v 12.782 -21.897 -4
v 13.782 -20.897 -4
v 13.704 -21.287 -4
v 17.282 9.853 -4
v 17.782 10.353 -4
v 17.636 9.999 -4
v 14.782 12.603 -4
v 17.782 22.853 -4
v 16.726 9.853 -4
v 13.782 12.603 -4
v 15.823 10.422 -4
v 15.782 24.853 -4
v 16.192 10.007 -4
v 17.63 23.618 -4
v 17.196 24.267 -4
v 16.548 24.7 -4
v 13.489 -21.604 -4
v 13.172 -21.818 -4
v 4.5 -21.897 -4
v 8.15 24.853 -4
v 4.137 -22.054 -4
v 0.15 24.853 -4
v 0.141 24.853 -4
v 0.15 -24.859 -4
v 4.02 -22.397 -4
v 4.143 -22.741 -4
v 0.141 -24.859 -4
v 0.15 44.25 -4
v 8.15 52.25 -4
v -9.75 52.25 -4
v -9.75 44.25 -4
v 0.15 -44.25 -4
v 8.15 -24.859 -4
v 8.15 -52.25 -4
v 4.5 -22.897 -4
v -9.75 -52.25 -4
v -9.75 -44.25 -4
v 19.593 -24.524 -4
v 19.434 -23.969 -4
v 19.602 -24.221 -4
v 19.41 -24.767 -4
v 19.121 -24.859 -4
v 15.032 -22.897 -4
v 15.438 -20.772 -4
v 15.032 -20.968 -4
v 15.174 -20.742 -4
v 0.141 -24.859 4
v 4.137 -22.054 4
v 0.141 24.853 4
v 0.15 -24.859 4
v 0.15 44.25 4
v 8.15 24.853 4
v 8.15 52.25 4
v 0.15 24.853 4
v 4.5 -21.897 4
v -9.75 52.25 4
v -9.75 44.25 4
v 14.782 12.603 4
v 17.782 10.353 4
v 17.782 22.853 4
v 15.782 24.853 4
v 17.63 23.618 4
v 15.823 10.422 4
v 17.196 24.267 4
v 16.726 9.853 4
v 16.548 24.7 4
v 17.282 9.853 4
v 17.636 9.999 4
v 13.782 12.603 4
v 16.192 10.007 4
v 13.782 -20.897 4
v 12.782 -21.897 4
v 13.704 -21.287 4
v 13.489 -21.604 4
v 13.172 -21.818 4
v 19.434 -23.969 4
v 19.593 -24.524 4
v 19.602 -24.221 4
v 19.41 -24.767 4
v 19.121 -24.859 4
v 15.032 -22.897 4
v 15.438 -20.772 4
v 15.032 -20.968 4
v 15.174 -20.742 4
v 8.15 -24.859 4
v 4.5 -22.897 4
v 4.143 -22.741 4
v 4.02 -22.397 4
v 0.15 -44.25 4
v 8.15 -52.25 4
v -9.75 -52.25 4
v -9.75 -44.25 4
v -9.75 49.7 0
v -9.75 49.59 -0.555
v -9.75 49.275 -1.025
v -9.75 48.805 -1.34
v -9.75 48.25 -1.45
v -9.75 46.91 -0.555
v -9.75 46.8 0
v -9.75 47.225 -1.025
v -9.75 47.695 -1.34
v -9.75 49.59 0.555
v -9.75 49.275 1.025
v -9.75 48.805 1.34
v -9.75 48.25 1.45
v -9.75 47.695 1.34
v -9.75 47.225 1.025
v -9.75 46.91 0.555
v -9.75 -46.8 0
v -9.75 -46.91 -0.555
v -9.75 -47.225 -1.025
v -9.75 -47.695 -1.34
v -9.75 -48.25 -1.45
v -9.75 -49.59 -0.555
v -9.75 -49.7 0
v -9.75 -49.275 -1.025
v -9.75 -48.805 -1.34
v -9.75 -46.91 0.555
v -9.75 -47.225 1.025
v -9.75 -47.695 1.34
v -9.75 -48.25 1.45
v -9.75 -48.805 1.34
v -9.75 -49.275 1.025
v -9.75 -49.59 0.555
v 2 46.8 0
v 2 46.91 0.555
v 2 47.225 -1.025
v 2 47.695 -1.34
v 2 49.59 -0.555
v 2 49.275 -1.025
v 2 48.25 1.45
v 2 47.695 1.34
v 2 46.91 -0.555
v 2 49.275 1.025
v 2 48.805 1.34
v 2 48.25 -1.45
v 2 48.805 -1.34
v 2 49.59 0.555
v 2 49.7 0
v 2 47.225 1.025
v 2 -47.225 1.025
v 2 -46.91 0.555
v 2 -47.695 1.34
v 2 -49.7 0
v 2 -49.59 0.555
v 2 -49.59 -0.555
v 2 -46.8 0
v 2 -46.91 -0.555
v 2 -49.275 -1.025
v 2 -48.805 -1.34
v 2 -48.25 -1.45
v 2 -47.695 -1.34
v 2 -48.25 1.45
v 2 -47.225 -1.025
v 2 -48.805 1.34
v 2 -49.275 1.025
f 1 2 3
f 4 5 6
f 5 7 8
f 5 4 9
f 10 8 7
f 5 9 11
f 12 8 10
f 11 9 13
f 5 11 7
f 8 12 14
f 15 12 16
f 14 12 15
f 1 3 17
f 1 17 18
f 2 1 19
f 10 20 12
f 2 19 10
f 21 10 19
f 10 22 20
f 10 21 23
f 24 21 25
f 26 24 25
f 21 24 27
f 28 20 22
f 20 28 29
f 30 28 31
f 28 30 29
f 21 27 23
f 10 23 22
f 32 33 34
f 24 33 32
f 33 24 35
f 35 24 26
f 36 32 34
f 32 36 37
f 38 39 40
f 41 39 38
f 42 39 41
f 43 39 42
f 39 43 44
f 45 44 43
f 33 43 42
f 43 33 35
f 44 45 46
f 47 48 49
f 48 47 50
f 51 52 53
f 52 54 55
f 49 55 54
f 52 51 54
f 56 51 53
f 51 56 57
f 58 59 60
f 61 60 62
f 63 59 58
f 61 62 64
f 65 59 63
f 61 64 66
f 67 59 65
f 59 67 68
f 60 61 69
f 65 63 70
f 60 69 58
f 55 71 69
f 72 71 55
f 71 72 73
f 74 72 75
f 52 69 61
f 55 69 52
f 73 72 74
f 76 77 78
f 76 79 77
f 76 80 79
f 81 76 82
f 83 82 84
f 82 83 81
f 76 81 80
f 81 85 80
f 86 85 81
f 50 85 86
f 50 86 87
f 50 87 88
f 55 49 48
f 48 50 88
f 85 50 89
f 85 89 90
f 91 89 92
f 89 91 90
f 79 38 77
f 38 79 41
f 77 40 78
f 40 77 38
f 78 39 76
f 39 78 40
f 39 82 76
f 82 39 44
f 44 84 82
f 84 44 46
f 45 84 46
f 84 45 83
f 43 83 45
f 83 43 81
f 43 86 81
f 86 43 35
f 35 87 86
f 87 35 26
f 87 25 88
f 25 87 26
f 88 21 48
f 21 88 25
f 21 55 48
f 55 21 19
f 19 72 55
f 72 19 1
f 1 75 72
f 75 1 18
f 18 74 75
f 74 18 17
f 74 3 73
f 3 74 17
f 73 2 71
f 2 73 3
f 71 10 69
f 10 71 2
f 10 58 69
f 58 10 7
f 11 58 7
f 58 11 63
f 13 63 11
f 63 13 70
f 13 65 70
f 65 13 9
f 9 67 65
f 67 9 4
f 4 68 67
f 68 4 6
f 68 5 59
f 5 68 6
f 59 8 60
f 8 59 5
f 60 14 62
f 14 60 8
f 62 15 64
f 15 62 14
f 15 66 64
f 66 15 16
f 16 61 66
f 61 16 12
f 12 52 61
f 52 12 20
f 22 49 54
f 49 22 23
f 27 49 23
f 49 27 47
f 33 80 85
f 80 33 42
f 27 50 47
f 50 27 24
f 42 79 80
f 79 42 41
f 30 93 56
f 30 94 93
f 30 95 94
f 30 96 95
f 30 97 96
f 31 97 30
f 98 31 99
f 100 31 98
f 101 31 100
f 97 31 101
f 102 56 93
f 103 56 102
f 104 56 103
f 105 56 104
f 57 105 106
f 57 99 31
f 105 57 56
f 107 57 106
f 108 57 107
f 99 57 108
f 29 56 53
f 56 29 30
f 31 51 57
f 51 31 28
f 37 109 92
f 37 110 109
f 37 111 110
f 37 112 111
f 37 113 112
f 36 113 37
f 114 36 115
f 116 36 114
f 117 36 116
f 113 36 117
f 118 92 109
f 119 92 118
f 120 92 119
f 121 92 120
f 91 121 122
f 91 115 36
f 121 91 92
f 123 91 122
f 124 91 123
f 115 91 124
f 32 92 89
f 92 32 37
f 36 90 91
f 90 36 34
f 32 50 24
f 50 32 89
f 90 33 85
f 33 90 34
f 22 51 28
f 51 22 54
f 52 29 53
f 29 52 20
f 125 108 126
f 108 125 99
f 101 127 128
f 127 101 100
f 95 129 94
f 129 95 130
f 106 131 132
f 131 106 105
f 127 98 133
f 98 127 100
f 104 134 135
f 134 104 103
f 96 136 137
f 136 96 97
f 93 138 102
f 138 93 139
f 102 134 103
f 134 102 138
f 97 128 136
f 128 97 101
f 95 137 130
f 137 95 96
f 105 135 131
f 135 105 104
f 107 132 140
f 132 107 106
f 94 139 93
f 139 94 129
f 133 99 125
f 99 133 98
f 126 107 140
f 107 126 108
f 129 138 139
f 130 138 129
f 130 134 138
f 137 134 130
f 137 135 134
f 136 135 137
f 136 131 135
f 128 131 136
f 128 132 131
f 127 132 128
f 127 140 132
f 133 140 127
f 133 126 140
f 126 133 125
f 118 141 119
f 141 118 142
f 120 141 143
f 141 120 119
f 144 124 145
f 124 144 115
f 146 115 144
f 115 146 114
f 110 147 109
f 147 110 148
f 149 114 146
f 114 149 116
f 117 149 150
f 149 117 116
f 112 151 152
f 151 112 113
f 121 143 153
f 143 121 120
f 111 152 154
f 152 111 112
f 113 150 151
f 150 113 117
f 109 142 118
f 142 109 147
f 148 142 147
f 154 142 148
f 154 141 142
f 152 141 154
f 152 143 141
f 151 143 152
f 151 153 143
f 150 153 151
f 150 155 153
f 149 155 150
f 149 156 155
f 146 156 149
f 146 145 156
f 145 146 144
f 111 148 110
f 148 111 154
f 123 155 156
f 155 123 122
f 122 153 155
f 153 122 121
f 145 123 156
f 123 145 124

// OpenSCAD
THICKNESS = 8;
HOLE_DEPTH = 10;
HOLE_DIAMETER = 2.9;
HOLE_DISTANCE = 96.5;

module din_clip() 
{	
	translate([0,-25,0]) 
	{
		difference() 
		{
			linear_extrude(height=THICKNESS, center=true, convexity=5) 
			{
				import(file="din_clip.dxf", layer="0", $fn=64);
			}
		}
	}
}

module din_mount()
{
	difference()
	{
		union()
		{
			din_clip();
			translate([-HOLE_DEPTH/2+0.25, HOLE_DISTANCE/2, 0]) cube([HOLE_DEPTH,THICKNESS,THICKNESS],center=true);
			translate([-HOLE_DEPTH/2+0.25, -HOLE_DISTANCE/2, 0]) cube([HOLE_DEPTH,THICKNESS,THICKNESS],center=true);
			translate([0.15, -24.75, -THICKNESS/2]) rotate([0,0,-90]) cube([HOLE_DISTANCE/2-50/2+THICKNESS/2+0.25,THICKNESS,THICKNESS]);
			translate([THICKNESS+0.15, 24.75, -THICKNESS/2]) rotate([0,0,90]) cube([HOLE_DISTANCE/2-50/2+THICKNESS/2+0.25,THICKNESS,THICKNESS]);
		}
		union() 
		{
			translate([-HOLE_DEPTH, HOLE_DISTANCE/2, 0]) 
			{
				rotate([0, 90, 0]) 
				{
					cylinder(h= HOLE_DEPTH+2, r = HOLE_DIAMETER / 2, $fn = 16);
				}
			}
			translate([-HOLE_DEPTH, -HOLE_DISTANCE/2, 0]) 
			{
				rotate([0, 90, 0]) 
				{
					cylinder(h= HOLE_DEPTH+2, r = HOLE_DIAMETER / 2, $fn = 16);
				}
			}
		}
	}
}

din_mount();
